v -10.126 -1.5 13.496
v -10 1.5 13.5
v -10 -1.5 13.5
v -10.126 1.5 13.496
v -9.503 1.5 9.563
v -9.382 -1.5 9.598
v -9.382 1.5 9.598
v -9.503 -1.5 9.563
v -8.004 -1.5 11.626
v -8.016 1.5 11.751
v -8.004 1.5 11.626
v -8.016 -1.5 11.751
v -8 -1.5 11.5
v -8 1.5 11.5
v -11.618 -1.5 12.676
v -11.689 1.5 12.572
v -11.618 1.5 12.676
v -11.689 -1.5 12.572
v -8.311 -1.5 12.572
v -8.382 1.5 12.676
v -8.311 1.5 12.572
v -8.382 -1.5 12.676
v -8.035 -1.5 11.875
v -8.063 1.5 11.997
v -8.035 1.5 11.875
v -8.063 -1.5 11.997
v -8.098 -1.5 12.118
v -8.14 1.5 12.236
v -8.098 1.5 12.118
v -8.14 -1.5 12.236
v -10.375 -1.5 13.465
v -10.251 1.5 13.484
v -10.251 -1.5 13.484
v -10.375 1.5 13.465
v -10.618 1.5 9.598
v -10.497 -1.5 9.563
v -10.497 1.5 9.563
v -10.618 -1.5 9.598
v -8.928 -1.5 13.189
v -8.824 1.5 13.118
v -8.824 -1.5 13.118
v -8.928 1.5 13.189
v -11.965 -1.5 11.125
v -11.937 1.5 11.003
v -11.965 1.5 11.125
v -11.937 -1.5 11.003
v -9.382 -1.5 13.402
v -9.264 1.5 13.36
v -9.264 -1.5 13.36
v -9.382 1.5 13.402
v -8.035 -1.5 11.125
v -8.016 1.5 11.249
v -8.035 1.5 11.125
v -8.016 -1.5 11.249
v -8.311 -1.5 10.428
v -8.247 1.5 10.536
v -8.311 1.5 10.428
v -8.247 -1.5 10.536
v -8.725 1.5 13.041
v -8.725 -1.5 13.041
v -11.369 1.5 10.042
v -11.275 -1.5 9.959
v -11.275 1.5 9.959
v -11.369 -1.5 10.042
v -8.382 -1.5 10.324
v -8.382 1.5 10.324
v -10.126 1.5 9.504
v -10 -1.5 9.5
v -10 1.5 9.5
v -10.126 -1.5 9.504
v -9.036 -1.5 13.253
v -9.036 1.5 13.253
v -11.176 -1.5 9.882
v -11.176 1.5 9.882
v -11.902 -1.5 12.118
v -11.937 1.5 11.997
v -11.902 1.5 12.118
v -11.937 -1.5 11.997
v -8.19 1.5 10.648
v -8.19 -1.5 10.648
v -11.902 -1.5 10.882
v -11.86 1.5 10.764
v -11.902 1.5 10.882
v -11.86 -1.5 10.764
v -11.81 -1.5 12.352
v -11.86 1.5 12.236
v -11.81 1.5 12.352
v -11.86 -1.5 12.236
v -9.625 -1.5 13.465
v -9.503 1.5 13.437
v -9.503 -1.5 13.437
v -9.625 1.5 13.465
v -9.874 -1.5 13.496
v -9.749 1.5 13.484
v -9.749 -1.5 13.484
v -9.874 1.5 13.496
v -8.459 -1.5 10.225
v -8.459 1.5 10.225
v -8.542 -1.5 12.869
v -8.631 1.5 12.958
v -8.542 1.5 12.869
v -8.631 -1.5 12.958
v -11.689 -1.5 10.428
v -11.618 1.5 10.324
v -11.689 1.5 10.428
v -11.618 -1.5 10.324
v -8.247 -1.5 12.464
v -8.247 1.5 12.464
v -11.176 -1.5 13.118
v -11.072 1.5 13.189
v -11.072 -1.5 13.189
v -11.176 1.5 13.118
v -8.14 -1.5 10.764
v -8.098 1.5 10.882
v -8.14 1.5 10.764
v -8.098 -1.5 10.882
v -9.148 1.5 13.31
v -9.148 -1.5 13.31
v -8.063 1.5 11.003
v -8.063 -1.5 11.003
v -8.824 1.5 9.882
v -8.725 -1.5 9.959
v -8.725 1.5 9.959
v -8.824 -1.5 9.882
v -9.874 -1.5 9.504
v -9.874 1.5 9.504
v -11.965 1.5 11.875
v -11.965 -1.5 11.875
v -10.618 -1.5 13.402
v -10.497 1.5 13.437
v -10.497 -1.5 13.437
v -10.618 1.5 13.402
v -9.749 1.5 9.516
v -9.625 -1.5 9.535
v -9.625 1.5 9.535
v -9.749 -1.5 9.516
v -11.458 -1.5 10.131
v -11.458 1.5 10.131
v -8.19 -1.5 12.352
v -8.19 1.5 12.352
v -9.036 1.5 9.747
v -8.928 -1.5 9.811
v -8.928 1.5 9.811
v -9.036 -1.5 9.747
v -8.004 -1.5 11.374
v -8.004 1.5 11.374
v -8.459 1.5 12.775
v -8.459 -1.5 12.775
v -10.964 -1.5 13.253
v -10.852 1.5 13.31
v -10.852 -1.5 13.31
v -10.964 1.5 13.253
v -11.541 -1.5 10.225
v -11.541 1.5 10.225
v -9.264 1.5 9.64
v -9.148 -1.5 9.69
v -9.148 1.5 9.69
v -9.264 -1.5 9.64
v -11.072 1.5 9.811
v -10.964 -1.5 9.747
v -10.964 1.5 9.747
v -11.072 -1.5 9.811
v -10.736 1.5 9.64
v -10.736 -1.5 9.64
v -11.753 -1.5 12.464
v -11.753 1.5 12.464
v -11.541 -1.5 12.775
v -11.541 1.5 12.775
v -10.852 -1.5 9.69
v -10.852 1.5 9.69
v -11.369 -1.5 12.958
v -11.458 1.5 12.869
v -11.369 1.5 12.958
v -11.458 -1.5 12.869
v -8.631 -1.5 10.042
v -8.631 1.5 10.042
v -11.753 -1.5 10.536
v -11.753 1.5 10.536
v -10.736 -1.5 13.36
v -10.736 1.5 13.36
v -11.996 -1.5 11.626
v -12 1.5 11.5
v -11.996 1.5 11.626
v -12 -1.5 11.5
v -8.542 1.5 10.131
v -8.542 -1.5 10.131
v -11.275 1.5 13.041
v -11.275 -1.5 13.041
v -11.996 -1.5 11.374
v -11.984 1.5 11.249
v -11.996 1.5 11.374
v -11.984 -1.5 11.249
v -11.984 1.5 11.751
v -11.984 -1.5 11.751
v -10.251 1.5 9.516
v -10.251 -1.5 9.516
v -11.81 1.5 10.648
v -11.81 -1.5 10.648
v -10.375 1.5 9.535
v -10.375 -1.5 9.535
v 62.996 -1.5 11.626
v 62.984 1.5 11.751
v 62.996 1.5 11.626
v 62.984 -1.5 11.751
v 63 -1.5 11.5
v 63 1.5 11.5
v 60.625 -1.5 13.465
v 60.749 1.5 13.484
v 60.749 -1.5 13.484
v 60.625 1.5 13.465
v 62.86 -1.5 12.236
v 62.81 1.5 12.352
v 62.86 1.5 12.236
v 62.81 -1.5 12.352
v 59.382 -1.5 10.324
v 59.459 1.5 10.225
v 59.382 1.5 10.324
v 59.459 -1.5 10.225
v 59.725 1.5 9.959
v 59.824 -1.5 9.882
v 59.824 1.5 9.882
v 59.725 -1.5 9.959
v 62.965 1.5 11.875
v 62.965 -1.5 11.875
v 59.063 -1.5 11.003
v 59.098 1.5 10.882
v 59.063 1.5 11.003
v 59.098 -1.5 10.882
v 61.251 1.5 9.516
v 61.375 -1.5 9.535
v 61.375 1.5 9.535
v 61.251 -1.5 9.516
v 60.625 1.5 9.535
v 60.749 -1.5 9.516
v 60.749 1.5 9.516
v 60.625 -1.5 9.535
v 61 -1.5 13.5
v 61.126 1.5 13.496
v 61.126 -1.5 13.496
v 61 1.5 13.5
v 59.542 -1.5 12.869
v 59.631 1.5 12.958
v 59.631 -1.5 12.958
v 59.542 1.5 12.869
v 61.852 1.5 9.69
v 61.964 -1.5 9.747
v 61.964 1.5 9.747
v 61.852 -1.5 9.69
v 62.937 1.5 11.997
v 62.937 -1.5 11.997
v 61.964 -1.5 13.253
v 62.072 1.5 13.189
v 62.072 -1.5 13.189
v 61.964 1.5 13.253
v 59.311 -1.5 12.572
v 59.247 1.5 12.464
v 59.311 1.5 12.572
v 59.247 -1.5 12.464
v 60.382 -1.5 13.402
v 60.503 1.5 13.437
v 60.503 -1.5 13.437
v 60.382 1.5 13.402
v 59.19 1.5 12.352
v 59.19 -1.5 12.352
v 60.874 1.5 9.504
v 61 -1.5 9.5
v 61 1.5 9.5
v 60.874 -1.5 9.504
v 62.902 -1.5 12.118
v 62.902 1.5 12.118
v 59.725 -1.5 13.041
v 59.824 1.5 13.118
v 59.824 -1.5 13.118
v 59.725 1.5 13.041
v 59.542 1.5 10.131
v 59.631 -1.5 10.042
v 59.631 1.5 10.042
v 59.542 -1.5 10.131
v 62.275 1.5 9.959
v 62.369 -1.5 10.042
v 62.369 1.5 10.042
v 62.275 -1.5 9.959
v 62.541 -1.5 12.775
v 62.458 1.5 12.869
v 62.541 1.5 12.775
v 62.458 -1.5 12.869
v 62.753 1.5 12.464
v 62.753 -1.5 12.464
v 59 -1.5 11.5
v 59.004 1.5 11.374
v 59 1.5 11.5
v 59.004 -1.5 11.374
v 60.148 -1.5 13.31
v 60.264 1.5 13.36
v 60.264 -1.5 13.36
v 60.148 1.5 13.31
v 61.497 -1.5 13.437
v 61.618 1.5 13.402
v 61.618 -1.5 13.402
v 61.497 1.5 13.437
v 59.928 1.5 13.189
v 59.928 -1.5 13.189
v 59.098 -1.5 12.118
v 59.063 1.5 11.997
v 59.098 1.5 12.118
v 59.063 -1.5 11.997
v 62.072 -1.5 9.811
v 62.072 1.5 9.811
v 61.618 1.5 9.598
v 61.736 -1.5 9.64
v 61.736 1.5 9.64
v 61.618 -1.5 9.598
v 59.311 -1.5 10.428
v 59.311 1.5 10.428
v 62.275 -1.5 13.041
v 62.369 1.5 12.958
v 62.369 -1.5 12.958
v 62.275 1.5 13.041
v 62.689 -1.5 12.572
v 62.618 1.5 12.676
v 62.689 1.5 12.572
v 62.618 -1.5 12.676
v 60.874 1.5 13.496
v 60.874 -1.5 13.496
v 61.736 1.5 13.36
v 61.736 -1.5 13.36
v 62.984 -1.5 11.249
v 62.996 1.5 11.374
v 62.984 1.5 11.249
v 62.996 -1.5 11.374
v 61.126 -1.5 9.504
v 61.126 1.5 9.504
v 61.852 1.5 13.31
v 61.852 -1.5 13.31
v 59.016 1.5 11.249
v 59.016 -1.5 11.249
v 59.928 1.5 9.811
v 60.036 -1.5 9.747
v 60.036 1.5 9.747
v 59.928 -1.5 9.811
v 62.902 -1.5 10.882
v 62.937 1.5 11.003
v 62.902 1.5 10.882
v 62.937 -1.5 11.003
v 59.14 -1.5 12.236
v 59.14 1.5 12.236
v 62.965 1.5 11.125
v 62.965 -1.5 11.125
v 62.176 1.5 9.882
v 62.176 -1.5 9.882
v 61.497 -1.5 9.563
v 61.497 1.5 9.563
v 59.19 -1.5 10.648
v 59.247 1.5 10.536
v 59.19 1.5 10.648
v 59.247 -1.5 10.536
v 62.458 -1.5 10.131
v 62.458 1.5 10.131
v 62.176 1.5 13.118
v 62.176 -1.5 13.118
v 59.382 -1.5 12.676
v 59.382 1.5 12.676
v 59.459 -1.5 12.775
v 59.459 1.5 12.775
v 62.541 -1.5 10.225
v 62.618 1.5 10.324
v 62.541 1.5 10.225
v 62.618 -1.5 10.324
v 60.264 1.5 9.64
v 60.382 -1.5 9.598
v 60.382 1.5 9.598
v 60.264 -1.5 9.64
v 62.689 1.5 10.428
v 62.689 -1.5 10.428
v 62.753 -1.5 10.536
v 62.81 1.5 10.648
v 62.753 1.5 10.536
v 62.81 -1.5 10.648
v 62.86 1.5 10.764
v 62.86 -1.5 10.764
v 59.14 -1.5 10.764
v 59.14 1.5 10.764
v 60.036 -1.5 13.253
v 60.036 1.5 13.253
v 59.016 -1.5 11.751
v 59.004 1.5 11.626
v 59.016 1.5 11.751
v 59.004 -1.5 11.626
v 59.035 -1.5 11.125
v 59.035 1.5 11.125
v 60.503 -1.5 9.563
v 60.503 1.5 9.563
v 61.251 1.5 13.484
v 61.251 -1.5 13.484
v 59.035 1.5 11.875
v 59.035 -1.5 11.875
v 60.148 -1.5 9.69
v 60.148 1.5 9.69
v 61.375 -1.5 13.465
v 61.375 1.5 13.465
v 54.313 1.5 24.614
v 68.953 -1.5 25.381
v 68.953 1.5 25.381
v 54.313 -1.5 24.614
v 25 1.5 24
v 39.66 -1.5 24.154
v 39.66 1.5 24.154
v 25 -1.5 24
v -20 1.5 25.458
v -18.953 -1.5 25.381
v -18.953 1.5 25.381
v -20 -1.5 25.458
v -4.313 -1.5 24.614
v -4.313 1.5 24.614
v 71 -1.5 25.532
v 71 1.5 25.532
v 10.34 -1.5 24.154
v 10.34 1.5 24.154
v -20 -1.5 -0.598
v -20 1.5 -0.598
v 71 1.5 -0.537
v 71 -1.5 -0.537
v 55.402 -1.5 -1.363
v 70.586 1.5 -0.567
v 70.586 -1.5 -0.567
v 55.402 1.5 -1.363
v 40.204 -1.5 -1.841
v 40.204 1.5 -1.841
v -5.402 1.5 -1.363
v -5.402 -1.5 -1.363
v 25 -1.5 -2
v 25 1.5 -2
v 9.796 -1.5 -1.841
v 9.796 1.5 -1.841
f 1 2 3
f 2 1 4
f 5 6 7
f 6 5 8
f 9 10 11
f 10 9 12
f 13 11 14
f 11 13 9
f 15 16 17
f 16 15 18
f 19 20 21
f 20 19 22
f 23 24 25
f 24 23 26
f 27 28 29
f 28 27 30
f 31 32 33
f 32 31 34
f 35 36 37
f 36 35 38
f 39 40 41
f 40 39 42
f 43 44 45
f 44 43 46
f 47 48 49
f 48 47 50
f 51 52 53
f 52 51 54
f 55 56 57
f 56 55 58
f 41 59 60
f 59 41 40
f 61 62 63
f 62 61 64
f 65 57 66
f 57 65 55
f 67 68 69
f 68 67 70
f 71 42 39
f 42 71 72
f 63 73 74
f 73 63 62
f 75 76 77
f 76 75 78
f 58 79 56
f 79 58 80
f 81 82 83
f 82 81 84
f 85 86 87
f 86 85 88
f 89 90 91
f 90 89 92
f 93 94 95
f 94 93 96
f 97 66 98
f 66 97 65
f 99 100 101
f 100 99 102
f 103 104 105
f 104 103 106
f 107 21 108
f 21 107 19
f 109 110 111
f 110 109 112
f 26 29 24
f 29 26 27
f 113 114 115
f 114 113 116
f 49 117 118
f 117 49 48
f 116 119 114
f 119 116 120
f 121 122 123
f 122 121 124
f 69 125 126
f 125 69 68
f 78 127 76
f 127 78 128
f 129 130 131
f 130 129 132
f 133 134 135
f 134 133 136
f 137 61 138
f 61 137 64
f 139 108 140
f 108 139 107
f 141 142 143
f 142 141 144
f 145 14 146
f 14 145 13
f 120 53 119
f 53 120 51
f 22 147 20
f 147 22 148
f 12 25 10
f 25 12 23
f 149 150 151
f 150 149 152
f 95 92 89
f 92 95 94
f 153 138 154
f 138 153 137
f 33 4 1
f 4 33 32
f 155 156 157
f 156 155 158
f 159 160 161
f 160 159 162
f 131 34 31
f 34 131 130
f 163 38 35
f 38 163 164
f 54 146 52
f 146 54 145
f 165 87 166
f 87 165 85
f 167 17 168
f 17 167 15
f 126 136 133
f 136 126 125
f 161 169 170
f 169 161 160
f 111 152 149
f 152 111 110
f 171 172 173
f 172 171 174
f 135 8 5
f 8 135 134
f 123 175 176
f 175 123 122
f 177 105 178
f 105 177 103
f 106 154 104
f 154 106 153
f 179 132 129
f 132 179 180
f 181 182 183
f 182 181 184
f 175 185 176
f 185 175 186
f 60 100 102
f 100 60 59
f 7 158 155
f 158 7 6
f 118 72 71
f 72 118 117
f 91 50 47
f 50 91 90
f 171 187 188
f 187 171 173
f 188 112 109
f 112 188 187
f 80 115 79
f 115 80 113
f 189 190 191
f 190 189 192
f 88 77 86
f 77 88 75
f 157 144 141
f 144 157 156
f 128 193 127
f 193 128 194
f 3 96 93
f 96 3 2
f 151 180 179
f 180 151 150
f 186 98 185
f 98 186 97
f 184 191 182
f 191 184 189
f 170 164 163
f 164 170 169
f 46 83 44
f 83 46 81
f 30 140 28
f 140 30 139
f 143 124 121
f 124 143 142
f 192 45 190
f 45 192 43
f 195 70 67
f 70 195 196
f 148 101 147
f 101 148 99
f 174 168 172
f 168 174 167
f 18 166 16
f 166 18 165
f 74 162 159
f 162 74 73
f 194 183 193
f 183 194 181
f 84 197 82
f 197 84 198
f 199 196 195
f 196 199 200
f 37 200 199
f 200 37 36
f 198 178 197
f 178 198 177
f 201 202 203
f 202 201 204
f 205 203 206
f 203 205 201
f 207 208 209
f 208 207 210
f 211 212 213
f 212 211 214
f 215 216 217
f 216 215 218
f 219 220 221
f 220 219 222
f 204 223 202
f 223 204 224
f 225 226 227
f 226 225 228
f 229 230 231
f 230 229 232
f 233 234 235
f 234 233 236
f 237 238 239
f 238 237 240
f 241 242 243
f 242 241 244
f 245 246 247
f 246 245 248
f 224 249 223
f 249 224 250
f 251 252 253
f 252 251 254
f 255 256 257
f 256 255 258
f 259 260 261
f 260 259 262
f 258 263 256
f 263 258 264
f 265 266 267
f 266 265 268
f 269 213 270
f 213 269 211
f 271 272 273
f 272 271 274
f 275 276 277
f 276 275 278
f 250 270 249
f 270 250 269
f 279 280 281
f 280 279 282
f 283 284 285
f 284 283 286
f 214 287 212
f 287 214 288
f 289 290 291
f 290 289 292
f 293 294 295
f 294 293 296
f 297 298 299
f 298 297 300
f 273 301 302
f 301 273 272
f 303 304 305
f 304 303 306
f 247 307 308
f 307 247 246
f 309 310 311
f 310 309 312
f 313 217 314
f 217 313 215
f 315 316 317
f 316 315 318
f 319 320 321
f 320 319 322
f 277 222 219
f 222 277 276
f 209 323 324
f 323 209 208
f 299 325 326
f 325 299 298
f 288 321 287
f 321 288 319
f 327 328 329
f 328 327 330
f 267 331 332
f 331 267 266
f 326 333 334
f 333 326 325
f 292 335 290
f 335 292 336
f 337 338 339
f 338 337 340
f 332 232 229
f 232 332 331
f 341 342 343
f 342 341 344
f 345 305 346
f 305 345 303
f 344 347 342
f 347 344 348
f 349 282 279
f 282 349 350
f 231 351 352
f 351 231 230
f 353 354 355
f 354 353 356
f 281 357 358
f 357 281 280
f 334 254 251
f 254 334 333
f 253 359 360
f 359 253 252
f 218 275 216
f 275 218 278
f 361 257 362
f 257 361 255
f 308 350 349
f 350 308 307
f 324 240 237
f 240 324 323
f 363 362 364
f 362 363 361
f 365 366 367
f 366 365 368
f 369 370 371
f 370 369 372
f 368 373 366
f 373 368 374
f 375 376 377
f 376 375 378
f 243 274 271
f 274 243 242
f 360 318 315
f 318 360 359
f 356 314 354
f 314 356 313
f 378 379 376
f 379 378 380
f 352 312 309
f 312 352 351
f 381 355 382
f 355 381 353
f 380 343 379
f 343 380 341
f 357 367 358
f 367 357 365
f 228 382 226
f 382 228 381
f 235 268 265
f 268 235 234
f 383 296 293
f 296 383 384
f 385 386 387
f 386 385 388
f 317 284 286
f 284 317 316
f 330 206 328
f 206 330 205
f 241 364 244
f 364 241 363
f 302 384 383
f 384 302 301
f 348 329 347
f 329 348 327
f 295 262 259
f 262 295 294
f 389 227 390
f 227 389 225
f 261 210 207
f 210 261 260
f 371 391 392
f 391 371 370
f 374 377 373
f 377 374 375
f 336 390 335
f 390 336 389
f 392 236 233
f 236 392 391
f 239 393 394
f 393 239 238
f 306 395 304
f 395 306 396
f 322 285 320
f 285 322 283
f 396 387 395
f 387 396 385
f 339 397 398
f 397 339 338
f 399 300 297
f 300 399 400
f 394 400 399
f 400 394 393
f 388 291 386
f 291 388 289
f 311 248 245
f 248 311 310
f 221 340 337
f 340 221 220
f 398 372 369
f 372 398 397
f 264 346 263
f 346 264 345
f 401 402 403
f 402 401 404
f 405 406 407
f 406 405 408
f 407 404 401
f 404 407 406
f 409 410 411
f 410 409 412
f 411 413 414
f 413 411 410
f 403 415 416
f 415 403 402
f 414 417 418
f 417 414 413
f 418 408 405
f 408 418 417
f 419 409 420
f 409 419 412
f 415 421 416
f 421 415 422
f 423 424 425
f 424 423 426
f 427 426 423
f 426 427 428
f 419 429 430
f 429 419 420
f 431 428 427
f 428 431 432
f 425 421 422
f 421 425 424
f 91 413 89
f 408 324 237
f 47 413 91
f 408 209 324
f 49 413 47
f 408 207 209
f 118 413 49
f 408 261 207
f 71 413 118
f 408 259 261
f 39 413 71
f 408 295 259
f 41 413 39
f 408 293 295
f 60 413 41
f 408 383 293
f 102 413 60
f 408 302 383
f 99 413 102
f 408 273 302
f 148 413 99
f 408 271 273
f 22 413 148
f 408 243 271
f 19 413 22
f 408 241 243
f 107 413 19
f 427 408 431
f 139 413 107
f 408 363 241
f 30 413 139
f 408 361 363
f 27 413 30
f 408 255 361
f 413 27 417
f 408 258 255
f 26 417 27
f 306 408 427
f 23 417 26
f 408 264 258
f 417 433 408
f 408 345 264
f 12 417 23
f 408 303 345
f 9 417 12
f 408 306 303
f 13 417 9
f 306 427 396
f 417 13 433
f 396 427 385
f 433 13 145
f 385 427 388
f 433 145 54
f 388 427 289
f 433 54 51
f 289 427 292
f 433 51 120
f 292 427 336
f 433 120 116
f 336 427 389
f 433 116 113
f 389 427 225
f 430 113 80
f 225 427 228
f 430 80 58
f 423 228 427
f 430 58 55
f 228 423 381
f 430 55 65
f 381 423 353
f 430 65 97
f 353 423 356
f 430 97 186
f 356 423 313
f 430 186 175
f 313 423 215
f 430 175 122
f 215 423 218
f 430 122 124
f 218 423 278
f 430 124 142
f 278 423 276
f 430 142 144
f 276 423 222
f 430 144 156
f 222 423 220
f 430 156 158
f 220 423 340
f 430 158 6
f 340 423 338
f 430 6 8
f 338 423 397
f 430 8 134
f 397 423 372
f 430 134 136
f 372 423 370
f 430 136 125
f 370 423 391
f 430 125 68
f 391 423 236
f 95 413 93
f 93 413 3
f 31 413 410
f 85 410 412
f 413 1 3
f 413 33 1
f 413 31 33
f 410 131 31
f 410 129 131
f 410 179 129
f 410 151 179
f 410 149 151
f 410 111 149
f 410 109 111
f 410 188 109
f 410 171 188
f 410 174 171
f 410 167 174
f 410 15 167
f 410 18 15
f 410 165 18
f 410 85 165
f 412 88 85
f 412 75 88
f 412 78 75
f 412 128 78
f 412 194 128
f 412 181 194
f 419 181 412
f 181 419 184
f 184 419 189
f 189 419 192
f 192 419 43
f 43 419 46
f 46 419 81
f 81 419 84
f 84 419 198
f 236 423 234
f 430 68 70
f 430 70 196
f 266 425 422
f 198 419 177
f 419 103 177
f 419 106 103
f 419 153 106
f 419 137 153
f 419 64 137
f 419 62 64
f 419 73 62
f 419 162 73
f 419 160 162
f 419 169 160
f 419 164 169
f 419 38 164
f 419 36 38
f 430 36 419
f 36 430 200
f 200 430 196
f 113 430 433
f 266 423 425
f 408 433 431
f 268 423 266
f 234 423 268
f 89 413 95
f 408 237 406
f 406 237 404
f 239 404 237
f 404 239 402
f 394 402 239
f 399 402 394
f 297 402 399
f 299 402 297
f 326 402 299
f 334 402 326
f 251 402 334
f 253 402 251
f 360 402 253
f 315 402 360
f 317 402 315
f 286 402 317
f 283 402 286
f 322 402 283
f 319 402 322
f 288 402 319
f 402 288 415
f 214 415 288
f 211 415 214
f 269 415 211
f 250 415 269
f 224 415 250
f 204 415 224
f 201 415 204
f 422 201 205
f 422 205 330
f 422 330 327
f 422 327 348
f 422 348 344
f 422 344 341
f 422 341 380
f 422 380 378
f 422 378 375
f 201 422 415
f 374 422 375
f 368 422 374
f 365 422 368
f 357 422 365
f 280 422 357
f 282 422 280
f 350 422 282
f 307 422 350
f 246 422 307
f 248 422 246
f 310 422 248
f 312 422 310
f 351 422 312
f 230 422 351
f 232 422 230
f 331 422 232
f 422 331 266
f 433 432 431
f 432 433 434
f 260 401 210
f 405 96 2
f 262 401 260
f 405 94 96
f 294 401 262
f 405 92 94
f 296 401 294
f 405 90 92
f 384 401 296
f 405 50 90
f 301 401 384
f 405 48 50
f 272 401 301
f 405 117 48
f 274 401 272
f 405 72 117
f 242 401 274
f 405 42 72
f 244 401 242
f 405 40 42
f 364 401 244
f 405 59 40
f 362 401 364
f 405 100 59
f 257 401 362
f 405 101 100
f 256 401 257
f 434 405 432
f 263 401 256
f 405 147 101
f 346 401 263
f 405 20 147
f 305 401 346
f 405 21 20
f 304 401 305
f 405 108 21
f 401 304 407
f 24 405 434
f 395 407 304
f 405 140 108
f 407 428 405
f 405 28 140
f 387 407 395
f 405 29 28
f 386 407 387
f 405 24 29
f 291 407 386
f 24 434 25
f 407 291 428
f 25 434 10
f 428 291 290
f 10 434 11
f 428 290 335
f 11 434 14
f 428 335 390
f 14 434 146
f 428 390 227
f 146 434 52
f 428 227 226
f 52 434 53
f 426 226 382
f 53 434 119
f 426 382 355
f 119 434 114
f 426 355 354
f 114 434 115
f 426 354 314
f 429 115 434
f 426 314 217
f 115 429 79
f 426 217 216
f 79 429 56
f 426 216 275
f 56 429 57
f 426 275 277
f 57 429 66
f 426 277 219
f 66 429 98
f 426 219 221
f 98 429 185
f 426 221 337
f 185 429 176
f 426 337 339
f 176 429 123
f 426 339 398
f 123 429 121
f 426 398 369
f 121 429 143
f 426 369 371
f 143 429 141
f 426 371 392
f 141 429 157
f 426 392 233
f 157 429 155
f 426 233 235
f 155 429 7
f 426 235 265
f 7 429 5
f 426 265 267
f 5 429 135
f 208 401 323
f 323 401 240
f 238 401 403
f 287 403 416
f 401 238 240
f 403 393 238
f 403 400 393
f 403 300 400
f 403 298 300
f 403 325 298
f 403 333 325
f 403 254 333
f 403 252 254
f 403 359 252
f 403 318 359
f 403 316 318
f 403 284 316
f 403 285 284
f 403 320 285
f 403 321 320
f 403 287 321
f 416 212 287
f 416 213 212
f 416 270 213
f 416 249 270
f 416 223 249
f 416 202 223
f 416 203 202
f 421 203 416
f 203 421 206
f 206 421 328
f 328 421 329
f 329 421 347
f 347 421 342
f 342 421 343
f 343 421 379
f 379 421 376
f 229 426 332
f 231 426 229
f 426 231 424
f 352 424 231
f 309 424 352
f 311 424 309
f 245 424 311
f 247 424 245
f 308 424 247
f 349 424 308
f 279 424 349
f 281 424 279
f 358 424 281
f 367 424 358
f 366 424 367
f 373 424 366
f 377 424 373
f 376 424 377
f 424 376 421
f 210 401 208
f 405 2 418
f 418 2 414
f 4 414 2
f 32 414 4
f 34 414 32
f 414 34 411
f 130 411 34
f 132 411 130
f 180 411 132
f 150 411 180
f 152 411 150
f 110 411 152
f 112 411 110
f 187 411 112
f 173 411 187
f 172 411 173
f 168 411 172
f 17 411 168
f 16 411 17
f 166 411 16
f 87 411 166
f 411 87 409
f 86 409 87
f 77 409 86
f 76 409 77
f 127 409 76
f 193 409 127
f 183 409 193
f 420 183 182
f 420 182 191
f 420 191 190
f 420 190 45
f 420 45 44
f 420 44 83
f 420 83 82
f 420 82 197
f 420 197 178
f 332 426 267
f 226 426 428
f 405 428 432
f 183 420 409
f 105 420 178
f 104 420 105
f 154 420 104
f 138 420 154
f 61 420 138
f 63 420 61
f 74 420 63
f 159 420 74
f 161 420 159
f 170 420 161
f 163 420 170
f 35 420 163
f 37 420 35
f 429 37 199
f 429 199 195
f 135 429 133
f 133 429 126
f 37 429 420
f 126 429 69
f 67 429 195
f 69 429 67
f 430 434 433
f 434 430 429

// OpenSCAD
difference(){
	union(){
        
         translate([25,0,724]){
            rotate(a = [90,0,0]) {
                cylinder(h=3, r=726, $fn=300, center=true);
            }
        }


	}
	union() {
         translate([-10,0,11.5]){
            rotate(a = [90,0,0]) {
                cylinder(h=600, r=2, $fn=100, center=true);
            }
       }			   
       translate([91-20-10,0,11.5]){
            rotate(a = [90,0,0]) {
                cylinder(h=600, r=2, $fn=100, center=true);
            }
       }			   

        // uitsparing ronding
         translate([25,0,724]){
            rotate(a = [90,0,0]) {
                cylinder(h=40, r=700, $fn=300, center=true);
            }
        }
        translate([-20-1000,-5,-50]){
           cube([1000,30,1000], center=false);
        }
        translate([71,-5,-5]){
           cube([1000,30,1000], center=false);
        }
        translate([-1000,-5,300]){
           cube([2000,30,2000], center=false);
        }


        
	}
}
